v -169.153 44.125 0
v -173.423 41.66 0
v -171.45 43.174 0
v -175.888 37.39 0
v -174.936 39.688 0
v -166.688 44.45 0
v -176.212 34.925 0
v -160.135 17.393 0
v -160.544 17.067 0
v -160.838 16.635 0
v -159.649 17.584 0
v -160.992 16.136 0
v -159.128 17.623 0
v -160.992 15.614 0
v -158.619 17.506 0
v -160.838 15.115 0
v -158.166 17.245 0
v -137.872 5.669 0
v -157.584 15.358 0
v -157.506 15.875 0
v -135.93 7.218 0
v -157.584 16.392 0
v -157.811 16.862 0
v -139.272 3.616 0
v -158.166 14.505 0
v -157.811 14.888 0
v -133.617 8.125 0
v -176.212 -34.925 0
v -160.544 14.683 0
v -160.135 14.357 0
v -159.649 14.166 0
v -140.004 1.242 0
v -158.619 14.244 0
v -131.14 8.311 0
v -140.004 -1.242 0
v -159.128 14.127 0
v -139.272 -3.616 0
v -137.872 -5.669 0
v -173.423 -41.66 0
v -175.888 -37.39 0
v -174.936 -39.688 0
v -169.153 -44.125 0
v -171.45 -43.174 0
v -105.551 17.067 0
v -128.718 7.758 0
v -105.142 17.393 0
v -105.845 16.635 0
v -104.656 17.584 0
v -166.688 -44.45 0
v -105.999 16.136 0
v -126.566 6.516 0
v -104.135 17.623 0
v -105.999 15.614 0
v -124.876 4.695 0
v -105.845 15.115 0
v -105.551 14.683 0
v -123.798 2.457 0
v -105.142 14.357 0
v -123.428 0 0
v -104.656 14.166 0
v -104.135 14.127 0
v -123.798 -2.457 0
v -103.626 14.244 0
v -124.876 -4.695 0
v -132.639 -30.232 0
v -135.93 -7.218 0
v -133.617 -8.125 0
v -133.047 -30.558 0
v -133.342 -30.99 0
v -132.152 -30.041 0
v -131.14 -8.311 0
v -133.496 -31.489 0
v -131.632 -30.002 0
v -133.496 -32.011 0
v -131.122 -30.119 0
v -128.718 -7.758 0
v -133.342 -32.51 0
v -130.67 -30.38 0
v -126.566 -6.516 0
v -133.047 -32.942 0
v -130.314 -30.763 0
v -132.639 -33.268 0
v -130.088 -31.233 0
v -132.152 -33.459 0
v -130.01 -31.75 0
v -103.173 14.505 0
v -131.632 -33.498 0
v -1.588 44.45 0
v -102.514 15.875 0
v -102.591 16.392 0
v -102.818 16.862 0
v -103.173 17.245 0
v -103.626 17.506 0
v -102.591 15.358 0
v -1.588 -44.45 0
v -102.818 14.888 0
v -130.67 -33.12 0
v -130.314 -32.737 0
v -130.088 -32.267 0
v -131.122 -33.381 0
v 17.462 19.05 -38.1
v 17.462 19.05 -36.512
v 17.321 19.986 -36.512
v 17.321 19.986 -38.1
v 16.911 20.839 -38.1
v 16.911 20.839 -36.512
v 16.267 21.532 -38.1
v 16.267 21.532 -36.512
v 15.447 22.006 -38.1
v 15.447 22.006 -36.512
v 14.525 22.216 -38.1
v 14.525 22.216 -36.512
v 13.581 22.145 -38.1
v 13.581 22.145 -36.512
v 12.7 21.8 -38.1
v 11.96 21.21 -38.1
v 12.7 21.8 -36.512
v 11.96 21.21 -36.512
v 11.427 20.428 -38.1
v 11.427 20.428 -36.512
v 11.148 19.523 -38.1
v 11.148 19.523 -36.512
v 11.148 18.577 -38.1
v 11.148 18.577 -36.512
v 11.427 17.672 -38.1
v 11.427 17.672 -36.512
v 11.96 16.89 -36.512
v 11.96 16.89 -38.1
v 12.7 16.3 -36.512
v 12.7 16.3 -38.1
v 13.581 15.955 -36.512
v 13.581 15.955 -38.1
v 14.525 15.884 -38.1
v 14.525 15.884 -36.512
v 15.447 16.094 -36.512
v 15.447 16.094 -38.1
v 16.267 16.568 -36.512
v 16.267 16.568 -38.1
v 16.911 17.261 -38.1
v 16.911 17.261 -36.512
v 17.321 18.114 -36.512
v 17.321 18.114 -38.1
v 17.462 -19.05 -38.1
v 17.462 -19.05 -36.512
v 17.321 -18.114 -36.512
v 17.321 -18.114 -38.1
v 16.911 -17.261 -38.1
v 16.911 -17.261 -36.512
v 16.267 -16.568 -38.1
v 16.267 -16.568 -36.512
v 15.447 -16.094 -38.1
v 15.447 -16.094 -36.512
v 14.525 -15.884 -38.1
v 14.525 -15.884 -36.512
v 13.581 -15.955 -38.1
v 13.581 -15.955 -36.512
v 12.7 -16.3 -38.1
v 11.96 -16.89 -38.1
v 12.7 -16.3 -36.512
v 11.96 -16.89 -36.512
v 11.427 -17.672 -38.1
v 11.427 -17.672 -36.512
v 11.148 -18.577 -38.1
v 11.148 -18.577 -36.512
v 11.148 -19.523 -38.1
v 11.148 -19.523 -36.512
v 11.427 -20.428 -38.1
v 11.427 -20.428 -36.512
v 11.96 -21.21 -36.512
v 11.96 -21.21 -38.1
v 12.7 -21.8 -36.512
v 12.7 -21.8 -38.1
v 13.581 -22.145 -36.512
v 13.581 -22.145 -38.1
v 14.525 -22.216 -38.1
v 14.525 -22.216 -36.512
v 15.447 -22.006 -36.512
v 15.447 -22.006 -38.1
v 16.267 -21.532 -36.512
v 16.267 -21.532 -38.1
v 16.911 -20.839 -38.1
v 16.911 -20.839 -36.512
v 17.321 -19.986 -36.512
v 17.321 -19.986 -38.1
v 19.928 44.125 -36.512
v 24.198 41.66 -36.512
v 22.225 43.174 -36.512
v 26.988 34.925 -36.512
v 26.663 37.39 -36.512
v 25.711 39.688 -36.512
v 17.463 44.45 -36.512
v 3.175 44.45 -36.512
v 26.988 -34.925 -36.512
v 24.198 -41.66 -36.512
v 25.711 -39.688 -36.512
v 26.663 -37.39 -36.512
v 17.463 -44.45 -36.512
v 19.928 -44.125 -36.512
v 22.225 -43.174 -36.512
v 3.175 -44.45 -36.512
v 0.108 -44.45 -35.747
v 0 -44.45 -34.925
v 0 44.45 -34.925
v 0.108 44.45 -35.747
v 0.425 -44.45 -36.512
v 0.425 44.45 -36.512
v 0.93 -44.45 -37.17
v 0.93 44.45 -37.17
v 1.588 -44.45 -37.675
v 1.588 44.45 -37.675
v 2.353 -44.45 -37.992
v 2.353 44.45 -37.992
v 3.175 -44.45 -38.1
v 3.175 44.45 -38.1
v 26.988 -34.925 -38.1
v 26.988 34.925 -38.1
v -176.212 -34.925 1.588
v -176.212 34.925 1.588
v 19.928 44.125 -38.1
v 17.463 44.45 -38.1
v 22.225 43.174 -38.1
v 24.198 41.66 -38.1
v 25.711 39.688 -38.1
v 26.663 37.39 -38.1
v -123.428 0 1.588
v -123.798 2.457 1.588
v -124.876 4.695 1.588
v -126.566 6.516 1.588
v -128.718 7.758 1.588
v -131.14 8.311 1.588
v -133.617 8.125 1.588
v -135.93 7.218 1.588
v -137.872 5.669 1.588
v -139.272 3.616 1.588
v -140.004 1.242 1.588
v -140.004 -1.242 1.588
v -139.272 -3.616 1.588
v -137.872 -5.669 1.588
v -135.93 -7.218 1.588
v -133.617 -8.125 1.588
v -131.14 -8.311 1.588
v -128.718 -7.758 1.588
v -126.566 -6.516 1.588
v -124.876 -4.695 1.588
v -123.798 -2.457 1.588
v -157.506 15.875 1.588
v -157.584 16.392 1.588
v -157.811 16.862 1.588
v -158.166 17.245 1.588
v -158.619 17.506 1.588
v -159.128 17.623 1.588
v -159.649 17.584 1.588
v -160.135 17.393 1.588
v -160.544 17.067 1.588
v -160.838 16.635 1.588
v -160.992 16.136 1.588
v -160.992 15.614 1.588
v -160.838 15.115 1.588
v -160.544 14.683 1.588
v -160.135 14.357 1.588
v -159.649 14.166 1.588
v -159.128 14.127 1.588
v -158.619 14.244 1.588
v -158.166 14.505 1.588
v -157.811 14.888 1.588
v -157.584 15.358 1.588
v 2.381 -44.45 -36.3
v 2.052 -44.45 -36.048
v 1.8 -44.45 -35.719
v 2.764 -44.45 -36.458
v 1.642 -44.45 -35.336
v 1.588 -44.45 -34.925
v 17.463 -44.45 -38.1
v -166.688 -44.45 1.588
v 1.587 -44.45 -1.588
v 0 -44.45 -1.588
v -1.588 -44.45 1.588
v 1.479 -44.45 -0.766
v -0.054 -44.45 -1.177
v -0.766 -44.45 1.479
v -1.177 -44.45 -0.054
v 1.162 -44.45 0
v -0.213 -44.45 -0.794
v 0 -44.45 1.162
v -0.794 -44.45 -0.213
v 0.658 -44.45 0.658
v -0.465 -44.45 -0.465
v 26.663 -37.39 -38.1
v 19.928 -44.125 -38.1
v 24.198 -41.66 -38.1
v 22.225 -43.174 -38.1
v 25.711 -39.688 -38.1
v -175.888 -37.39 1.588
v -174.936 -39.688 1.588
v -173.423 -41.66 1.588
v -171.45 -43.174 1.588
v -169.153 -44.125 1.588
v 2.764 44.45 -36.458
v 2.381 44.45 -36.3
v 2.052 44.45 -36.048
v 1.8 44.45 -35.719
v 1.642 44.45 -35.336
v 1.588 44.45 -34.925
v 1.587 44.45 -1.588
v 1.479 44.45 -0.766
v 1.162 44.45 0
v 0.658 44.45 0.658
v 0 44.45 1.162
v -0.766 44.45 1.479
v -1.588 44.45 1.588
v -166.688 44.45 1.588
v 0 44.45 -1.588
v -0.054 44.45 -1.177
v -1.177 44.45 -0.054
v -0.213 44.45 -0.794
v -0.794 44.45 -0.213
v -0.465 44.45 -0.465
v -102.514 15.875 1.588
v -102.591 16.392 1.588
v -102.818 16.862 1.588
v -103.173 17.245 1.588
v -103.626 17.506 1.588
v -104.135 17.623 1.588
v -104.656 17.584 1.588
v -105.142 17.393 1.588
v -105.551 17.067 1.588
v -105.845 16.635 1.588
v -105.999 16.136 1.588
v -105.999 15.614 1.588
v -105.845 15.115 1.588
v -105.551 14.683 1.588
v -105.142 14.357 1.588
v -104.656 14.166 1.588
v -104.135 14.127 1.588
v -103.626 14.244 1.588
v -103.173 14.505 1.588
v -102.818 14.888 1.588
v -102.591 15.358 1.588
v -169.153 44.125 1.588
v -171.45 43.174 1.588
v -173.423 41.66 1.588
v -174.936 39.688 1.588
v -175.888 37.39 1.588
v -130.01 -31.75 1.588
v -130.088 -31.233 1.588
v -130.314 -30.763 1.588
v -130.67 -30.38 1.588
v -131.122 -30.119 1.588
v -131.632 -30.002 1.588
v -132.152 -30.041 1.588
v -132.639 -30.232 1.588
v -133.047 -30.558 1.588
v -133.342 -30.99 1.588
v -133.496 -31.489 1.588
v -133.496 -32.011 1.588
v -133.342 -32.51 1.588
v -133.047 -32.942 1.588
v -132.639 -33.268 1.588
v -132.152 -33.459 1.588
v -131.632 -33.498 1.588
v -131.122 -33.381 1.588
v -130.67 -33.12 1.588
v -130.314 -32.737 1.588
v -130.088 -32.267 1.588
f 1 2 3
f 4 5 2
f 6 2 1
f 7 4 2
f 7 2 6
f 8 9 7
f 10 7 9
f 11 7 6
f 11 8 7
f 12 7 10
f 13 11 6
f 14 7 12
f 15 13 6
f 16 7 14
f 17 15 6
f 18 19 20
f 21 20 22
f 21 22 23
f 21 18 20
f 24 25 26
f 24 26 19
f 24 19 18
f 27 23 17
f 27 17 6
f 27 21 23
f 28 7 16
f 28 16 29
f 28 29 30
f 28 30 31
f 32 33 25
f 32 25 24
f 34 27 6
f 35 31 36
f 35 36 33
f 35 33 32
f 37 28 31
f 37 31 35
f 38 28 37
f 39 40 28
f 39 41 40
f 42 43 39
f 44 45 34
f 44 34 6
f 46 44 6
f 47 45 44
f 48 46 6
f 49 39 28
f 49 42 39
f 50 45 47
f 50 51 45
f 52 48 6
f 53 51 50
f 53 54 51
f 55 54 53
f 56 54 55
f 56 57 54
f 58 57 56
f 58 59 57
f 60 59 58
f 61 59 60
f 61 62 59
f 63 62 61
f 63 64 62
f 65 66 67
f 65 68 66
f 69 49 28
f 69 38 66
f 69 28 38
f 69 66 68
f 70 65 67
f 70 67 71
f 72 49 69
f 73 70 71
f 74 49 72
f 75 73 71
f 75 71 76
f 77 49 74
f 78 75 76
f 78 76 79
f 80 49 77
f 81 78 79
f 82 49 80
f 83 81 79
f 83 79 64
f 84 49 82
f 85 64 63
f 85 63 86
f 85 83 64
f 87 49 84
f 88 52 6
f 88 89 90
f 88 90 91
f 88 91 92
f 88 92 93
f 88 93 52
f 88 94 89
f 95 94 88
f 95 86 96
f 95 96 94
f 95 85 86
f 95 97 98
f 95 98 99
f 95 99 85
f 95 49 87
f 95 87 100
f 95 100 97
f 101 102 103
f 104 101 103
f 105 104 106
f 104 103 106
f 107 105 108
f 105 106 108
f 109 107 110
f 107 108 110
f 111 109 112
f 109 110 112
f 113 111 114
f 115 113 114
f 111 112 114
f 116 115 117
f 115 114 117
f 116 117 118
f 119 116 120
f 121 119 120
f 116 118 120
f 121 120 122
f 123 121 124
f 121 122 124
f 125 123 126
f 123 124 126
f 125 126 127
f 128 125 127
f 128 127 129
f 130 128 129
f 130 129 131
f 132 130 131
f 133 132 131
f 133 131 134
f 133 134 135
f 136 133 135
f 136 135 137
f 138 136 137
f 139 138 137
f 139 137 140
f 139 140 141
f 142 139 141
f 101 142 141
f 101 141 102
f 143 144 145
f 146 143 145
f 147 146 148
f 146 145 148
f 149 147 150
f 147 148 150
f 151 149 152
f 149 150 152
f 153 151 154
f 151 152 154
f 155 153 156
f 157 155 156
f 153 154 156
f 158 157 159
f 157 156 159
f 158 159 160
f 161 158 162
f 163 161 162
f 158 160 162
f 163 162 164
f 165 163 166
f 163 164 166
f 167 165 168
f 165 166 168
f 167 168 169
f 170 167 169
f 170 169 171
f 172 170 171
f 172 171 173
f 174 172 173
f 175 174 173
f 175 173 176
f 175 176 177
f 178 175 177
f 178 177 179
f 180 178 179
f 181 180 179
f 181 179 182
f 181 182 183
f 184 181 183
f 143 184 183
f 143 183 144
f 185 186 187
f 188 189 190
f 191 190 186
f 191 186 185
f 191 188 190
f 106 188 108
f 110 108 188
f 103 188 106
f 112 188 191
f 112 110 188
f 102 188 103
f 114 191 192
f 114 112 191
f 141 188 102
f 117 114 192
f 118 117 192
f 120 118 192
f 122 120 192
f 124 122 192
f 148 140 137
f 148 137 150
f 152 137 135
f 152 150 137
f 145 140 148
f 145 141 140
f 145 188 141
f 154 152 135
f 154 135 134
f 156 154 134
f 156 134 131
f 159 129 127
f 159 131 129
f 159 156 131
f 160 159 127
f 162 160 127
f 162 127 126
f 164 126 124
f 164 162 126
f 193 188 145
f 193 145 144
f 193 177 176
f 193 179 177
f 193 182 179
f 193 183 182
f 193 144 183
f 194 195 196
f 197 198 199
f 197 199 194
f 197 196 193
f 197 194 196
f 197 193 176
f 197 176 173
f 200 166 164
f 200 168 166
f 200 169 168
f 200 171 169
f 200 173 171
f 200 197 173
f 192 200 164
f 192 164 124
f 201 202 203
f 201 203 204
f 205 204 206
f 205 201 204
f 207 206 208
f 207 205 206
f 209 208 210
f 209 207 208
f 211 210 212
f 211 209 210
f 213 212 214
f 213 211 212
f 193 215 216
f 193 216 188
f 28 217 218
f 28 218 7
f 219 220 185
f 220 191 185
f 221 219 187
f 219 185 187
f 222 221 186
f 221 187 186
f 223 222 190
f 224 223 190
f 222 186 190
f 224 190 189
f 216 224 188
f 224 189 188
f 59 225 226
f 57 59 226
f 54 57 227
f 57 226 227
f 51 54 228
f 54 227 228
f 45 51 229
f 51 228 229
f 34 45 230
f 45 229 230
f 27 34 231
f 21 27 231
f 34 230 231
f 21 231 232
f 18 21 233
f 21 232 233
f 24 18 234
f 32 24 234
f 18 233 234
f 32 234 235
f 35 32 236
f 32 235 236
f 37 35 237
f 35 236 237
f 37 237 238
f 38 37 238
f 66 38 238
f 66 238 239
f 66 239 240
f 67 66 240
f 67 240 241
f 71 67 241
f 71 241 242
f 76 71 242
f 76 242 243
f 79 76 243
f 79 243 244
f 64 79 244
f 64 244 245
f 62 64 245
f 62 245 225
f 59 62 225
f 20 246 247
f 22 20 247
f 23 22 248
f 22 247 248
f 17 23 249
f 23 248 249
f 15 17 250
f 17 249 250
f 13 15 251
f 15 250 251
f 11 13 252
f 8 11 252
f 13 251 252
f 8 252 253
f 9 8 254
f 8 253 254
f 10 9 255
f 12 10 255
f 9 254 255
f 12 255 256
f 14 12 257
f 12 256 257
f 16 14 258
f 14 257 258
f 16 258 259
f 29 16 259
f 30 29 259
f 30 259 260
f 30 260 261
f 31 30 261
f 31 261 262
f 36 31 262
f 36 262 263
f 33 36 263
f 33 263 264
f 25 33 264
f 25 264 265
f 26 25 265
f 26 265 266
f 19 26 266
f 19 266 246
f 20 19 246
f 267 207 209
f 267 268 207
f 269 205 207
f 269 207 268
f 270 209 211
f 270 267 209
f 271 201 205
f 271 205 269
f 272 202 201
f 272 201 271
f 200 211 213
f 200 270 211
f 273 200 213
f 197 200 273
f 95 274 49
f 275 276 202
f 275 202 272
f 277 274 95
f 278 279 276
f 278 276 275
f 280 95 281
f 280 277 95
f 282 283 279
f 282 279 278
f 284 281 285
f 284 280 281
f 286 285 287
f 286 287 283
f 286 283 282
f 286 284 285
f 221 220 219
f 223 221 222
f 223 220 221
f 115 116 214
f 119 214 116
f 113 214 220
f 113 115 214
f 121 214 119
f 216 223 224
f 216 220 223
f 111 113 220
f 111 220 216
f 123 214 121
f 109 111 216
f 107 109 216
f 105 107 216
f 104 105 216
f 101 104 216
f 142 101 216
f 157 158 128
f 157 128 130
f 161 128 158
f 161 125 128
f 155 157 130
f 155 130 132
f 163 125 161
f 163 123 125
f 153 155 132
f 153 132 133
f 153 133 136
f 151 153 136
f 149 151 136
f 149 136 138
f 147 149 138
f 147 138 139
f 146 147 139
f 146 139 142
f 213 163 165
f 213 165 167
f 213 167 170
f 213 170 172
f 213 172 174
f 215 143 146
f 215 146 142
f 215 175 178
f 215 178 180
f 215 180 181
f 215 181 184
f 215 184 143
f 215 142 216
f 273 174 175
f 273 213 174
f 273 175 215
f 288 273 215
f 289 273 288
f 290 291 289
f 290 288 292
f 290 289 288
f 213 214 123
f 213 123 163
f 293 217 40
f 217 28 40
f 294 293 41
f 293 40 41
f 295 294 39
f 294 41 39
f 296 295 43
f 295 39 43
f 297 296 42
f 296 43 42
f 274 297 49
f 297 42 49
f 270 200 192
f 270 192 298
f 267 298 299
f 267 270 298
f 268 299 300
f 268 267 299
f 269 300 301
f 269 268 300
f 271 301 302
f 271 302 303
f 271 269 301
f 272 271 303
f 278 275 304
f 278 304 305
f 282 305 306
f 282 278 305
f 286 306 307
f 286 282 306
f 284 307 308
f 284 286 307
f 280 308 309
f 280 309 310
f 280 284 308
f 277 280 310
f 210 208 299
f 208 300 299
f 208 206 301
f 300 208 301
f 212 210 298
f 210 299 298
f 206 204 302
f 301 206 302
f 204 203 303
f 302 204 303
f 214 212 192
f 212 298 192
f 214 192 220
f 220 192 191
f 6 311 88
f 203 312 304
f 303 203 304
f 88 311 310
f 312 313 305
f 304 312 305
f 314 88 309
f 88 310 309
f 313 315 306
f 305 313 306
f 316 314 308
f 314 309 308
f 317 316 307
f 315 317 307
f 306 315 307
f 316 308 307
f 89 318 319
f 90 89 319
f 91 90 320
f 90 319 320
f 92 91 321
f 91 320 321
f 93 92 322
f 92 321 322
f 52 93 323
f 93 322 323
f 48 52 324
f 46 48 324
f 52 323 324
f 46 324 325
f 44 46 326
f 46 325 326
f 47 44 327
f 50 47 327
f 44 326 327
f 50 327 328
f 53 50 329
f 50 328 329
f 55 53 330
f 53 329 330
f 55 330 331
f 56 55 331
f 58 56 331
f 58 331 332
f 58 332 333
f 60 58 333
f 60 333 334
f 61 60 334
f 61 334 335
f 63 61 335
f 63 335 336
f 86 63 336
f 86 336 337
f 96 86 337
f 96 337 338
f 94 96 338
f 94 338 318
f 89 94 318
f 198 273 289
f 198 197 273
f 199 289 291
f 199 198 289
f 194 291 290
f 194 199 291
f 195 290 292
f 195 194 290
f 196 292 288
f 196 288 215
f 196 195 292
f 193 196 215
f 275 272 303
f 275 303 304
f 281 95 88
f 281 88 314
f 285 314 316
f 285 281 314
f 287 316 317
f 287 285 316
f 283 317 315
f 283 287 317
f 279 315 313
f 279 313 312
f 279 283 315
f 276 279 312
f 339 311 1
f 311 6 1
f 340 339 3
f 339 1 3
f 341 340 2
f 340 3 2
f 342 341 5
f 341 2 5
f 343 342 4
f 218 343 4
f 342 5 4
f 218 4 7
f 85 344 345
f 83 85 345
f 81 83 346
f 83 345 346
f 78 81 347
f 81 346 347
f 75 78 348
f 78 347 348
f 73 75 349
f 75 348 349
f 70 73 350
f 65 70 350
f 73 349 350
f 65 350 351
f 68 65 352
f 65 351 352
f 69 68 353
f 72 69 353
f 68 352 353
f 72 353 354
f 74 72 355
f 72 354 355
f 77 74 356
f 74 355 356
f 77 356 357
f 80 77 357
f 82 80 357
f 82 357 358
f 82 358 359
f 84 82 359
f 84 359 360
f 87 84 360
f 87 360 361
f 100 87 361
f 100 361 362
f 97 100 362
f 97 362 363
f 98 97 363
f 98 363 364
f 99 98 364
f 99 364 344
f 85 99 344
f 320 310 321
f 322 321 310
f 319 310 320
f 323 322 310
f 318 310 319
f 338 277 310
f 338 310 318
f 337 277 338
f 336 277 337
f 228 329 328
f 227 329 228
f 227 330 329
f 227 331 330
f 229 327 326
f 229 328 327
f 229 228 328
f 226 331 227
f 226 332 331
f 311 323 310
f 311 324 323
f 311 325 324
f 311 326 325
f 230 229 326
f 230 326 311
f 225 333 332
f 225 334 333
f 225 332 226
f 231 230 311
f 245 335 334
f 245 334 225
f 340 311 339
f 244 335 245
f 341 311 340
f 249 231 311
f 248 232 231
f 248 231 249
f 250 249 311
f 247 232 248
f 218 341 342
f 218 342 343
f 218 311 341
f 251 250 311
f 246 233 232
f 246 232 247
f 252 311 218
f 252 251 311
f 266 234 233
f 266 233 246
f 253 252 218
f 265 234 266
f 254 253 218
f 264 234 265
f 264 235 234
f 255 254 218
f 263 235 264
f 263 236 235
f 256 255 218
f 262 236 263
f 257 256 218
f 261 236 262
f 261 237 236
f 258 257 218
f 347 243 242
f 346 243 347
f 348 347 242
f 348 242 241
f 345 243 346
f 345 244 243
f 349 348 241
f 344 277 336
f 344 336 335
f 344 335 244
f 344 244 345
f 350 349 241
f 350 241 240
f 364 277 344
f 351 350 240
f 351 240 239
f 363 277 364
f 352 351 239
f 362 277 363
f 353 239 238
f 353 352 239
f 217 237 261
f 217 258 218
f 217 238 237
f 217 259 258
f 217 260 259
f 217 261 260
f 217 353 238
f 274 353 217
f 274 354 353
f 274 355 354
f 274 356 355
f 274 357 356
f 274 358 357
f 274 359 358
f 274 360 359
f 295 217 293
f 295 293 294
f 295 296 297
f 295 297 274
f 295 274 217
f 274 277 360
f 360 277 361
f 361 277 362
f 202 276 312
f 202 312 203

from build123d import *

# Parameters (mm, degrees)
F1_DEPTH = 44.45
F2_R     = 8.334375
F2_R_2   = 3.175
F2_R_3   = 1.7526
F3_DEPTH = 39.6885
F4_R     = 9.525


with BuildPart() as f1:
    # F0 (on Front) → F1 (new body, symmetric)
    with BuildSketch(Plane.XZ):
        with BuildLine():
            Line((-176.2125, 0), (-1.5875, 0))
            ThreePointArc((-1.5875, 0), (-0.464968, -0.464968), (0, -1.5875))
            Line((0, -1.5875), (0, -34.925))
            ThreePointArc((0, -34.925), (0.929936, -37.170064), (3.175, -38.1))
            Line((3.175, -38.1), (26.9875, -38.1))
            Line((26.9875, -38.1), (26.9875, -36.5125))
            Line((26.9875, -36.5125), (3.175, -36.5125))
            ThreePointArc((3.175, -36.5125), (2.052468, -36.047532), (1.5875, -34.925))
            Line((1.5875, -34.925), (1.5875, -1.5875))
            ThreePointArc((1.5875, -1.5875), (0.657564, 0.657564), (-1.5875, 1.5875))
            Line((-1.5875, 1.5875), (-176.2125, 1.5875))
            Line((-176.2125, 1.5875), (-176.2125, 0))
        make_face()
    extrude(amount=F1_DEPTH, both=True)

    # F2 (on face) → F3 (cut, through all)
    with BuildSketch(Plane.XY.offset(1.5875)):
        with Locations((-131.7625, 0)):
            Circle(F2_R)
        with Locations((14.2875, 19.05)):
            Circle(F2_R_2)
        with Locations((14.2875, -19.05)):
            Circle(F2_R_2)
        with Locations((-131.7625, -31.75)):
            Circle(F2_R_3)
        with Locations((-104.266193, 15.875)):
            Circle(F2_R_3)
        with Locations((-159.258807, 15.875)):
            Circle(F2_R_3)
    extrude(amount=-F3_DEPTH, mode=Mode.SUBTRACT)

    # F4
    f4_edges = [f1.edges().sort_by_distance(p)[0] for p in [
        (-176.2125, -44.45, 0.79375),
        (-176.2125, 44.45, 0.79375),
        (26.9875, 44.45, -37.30625),
        (26.9875, -44.45, -37.30625),
    ]]
    fillet(f4_edges, radius=F4_R)


solid = f1.part
